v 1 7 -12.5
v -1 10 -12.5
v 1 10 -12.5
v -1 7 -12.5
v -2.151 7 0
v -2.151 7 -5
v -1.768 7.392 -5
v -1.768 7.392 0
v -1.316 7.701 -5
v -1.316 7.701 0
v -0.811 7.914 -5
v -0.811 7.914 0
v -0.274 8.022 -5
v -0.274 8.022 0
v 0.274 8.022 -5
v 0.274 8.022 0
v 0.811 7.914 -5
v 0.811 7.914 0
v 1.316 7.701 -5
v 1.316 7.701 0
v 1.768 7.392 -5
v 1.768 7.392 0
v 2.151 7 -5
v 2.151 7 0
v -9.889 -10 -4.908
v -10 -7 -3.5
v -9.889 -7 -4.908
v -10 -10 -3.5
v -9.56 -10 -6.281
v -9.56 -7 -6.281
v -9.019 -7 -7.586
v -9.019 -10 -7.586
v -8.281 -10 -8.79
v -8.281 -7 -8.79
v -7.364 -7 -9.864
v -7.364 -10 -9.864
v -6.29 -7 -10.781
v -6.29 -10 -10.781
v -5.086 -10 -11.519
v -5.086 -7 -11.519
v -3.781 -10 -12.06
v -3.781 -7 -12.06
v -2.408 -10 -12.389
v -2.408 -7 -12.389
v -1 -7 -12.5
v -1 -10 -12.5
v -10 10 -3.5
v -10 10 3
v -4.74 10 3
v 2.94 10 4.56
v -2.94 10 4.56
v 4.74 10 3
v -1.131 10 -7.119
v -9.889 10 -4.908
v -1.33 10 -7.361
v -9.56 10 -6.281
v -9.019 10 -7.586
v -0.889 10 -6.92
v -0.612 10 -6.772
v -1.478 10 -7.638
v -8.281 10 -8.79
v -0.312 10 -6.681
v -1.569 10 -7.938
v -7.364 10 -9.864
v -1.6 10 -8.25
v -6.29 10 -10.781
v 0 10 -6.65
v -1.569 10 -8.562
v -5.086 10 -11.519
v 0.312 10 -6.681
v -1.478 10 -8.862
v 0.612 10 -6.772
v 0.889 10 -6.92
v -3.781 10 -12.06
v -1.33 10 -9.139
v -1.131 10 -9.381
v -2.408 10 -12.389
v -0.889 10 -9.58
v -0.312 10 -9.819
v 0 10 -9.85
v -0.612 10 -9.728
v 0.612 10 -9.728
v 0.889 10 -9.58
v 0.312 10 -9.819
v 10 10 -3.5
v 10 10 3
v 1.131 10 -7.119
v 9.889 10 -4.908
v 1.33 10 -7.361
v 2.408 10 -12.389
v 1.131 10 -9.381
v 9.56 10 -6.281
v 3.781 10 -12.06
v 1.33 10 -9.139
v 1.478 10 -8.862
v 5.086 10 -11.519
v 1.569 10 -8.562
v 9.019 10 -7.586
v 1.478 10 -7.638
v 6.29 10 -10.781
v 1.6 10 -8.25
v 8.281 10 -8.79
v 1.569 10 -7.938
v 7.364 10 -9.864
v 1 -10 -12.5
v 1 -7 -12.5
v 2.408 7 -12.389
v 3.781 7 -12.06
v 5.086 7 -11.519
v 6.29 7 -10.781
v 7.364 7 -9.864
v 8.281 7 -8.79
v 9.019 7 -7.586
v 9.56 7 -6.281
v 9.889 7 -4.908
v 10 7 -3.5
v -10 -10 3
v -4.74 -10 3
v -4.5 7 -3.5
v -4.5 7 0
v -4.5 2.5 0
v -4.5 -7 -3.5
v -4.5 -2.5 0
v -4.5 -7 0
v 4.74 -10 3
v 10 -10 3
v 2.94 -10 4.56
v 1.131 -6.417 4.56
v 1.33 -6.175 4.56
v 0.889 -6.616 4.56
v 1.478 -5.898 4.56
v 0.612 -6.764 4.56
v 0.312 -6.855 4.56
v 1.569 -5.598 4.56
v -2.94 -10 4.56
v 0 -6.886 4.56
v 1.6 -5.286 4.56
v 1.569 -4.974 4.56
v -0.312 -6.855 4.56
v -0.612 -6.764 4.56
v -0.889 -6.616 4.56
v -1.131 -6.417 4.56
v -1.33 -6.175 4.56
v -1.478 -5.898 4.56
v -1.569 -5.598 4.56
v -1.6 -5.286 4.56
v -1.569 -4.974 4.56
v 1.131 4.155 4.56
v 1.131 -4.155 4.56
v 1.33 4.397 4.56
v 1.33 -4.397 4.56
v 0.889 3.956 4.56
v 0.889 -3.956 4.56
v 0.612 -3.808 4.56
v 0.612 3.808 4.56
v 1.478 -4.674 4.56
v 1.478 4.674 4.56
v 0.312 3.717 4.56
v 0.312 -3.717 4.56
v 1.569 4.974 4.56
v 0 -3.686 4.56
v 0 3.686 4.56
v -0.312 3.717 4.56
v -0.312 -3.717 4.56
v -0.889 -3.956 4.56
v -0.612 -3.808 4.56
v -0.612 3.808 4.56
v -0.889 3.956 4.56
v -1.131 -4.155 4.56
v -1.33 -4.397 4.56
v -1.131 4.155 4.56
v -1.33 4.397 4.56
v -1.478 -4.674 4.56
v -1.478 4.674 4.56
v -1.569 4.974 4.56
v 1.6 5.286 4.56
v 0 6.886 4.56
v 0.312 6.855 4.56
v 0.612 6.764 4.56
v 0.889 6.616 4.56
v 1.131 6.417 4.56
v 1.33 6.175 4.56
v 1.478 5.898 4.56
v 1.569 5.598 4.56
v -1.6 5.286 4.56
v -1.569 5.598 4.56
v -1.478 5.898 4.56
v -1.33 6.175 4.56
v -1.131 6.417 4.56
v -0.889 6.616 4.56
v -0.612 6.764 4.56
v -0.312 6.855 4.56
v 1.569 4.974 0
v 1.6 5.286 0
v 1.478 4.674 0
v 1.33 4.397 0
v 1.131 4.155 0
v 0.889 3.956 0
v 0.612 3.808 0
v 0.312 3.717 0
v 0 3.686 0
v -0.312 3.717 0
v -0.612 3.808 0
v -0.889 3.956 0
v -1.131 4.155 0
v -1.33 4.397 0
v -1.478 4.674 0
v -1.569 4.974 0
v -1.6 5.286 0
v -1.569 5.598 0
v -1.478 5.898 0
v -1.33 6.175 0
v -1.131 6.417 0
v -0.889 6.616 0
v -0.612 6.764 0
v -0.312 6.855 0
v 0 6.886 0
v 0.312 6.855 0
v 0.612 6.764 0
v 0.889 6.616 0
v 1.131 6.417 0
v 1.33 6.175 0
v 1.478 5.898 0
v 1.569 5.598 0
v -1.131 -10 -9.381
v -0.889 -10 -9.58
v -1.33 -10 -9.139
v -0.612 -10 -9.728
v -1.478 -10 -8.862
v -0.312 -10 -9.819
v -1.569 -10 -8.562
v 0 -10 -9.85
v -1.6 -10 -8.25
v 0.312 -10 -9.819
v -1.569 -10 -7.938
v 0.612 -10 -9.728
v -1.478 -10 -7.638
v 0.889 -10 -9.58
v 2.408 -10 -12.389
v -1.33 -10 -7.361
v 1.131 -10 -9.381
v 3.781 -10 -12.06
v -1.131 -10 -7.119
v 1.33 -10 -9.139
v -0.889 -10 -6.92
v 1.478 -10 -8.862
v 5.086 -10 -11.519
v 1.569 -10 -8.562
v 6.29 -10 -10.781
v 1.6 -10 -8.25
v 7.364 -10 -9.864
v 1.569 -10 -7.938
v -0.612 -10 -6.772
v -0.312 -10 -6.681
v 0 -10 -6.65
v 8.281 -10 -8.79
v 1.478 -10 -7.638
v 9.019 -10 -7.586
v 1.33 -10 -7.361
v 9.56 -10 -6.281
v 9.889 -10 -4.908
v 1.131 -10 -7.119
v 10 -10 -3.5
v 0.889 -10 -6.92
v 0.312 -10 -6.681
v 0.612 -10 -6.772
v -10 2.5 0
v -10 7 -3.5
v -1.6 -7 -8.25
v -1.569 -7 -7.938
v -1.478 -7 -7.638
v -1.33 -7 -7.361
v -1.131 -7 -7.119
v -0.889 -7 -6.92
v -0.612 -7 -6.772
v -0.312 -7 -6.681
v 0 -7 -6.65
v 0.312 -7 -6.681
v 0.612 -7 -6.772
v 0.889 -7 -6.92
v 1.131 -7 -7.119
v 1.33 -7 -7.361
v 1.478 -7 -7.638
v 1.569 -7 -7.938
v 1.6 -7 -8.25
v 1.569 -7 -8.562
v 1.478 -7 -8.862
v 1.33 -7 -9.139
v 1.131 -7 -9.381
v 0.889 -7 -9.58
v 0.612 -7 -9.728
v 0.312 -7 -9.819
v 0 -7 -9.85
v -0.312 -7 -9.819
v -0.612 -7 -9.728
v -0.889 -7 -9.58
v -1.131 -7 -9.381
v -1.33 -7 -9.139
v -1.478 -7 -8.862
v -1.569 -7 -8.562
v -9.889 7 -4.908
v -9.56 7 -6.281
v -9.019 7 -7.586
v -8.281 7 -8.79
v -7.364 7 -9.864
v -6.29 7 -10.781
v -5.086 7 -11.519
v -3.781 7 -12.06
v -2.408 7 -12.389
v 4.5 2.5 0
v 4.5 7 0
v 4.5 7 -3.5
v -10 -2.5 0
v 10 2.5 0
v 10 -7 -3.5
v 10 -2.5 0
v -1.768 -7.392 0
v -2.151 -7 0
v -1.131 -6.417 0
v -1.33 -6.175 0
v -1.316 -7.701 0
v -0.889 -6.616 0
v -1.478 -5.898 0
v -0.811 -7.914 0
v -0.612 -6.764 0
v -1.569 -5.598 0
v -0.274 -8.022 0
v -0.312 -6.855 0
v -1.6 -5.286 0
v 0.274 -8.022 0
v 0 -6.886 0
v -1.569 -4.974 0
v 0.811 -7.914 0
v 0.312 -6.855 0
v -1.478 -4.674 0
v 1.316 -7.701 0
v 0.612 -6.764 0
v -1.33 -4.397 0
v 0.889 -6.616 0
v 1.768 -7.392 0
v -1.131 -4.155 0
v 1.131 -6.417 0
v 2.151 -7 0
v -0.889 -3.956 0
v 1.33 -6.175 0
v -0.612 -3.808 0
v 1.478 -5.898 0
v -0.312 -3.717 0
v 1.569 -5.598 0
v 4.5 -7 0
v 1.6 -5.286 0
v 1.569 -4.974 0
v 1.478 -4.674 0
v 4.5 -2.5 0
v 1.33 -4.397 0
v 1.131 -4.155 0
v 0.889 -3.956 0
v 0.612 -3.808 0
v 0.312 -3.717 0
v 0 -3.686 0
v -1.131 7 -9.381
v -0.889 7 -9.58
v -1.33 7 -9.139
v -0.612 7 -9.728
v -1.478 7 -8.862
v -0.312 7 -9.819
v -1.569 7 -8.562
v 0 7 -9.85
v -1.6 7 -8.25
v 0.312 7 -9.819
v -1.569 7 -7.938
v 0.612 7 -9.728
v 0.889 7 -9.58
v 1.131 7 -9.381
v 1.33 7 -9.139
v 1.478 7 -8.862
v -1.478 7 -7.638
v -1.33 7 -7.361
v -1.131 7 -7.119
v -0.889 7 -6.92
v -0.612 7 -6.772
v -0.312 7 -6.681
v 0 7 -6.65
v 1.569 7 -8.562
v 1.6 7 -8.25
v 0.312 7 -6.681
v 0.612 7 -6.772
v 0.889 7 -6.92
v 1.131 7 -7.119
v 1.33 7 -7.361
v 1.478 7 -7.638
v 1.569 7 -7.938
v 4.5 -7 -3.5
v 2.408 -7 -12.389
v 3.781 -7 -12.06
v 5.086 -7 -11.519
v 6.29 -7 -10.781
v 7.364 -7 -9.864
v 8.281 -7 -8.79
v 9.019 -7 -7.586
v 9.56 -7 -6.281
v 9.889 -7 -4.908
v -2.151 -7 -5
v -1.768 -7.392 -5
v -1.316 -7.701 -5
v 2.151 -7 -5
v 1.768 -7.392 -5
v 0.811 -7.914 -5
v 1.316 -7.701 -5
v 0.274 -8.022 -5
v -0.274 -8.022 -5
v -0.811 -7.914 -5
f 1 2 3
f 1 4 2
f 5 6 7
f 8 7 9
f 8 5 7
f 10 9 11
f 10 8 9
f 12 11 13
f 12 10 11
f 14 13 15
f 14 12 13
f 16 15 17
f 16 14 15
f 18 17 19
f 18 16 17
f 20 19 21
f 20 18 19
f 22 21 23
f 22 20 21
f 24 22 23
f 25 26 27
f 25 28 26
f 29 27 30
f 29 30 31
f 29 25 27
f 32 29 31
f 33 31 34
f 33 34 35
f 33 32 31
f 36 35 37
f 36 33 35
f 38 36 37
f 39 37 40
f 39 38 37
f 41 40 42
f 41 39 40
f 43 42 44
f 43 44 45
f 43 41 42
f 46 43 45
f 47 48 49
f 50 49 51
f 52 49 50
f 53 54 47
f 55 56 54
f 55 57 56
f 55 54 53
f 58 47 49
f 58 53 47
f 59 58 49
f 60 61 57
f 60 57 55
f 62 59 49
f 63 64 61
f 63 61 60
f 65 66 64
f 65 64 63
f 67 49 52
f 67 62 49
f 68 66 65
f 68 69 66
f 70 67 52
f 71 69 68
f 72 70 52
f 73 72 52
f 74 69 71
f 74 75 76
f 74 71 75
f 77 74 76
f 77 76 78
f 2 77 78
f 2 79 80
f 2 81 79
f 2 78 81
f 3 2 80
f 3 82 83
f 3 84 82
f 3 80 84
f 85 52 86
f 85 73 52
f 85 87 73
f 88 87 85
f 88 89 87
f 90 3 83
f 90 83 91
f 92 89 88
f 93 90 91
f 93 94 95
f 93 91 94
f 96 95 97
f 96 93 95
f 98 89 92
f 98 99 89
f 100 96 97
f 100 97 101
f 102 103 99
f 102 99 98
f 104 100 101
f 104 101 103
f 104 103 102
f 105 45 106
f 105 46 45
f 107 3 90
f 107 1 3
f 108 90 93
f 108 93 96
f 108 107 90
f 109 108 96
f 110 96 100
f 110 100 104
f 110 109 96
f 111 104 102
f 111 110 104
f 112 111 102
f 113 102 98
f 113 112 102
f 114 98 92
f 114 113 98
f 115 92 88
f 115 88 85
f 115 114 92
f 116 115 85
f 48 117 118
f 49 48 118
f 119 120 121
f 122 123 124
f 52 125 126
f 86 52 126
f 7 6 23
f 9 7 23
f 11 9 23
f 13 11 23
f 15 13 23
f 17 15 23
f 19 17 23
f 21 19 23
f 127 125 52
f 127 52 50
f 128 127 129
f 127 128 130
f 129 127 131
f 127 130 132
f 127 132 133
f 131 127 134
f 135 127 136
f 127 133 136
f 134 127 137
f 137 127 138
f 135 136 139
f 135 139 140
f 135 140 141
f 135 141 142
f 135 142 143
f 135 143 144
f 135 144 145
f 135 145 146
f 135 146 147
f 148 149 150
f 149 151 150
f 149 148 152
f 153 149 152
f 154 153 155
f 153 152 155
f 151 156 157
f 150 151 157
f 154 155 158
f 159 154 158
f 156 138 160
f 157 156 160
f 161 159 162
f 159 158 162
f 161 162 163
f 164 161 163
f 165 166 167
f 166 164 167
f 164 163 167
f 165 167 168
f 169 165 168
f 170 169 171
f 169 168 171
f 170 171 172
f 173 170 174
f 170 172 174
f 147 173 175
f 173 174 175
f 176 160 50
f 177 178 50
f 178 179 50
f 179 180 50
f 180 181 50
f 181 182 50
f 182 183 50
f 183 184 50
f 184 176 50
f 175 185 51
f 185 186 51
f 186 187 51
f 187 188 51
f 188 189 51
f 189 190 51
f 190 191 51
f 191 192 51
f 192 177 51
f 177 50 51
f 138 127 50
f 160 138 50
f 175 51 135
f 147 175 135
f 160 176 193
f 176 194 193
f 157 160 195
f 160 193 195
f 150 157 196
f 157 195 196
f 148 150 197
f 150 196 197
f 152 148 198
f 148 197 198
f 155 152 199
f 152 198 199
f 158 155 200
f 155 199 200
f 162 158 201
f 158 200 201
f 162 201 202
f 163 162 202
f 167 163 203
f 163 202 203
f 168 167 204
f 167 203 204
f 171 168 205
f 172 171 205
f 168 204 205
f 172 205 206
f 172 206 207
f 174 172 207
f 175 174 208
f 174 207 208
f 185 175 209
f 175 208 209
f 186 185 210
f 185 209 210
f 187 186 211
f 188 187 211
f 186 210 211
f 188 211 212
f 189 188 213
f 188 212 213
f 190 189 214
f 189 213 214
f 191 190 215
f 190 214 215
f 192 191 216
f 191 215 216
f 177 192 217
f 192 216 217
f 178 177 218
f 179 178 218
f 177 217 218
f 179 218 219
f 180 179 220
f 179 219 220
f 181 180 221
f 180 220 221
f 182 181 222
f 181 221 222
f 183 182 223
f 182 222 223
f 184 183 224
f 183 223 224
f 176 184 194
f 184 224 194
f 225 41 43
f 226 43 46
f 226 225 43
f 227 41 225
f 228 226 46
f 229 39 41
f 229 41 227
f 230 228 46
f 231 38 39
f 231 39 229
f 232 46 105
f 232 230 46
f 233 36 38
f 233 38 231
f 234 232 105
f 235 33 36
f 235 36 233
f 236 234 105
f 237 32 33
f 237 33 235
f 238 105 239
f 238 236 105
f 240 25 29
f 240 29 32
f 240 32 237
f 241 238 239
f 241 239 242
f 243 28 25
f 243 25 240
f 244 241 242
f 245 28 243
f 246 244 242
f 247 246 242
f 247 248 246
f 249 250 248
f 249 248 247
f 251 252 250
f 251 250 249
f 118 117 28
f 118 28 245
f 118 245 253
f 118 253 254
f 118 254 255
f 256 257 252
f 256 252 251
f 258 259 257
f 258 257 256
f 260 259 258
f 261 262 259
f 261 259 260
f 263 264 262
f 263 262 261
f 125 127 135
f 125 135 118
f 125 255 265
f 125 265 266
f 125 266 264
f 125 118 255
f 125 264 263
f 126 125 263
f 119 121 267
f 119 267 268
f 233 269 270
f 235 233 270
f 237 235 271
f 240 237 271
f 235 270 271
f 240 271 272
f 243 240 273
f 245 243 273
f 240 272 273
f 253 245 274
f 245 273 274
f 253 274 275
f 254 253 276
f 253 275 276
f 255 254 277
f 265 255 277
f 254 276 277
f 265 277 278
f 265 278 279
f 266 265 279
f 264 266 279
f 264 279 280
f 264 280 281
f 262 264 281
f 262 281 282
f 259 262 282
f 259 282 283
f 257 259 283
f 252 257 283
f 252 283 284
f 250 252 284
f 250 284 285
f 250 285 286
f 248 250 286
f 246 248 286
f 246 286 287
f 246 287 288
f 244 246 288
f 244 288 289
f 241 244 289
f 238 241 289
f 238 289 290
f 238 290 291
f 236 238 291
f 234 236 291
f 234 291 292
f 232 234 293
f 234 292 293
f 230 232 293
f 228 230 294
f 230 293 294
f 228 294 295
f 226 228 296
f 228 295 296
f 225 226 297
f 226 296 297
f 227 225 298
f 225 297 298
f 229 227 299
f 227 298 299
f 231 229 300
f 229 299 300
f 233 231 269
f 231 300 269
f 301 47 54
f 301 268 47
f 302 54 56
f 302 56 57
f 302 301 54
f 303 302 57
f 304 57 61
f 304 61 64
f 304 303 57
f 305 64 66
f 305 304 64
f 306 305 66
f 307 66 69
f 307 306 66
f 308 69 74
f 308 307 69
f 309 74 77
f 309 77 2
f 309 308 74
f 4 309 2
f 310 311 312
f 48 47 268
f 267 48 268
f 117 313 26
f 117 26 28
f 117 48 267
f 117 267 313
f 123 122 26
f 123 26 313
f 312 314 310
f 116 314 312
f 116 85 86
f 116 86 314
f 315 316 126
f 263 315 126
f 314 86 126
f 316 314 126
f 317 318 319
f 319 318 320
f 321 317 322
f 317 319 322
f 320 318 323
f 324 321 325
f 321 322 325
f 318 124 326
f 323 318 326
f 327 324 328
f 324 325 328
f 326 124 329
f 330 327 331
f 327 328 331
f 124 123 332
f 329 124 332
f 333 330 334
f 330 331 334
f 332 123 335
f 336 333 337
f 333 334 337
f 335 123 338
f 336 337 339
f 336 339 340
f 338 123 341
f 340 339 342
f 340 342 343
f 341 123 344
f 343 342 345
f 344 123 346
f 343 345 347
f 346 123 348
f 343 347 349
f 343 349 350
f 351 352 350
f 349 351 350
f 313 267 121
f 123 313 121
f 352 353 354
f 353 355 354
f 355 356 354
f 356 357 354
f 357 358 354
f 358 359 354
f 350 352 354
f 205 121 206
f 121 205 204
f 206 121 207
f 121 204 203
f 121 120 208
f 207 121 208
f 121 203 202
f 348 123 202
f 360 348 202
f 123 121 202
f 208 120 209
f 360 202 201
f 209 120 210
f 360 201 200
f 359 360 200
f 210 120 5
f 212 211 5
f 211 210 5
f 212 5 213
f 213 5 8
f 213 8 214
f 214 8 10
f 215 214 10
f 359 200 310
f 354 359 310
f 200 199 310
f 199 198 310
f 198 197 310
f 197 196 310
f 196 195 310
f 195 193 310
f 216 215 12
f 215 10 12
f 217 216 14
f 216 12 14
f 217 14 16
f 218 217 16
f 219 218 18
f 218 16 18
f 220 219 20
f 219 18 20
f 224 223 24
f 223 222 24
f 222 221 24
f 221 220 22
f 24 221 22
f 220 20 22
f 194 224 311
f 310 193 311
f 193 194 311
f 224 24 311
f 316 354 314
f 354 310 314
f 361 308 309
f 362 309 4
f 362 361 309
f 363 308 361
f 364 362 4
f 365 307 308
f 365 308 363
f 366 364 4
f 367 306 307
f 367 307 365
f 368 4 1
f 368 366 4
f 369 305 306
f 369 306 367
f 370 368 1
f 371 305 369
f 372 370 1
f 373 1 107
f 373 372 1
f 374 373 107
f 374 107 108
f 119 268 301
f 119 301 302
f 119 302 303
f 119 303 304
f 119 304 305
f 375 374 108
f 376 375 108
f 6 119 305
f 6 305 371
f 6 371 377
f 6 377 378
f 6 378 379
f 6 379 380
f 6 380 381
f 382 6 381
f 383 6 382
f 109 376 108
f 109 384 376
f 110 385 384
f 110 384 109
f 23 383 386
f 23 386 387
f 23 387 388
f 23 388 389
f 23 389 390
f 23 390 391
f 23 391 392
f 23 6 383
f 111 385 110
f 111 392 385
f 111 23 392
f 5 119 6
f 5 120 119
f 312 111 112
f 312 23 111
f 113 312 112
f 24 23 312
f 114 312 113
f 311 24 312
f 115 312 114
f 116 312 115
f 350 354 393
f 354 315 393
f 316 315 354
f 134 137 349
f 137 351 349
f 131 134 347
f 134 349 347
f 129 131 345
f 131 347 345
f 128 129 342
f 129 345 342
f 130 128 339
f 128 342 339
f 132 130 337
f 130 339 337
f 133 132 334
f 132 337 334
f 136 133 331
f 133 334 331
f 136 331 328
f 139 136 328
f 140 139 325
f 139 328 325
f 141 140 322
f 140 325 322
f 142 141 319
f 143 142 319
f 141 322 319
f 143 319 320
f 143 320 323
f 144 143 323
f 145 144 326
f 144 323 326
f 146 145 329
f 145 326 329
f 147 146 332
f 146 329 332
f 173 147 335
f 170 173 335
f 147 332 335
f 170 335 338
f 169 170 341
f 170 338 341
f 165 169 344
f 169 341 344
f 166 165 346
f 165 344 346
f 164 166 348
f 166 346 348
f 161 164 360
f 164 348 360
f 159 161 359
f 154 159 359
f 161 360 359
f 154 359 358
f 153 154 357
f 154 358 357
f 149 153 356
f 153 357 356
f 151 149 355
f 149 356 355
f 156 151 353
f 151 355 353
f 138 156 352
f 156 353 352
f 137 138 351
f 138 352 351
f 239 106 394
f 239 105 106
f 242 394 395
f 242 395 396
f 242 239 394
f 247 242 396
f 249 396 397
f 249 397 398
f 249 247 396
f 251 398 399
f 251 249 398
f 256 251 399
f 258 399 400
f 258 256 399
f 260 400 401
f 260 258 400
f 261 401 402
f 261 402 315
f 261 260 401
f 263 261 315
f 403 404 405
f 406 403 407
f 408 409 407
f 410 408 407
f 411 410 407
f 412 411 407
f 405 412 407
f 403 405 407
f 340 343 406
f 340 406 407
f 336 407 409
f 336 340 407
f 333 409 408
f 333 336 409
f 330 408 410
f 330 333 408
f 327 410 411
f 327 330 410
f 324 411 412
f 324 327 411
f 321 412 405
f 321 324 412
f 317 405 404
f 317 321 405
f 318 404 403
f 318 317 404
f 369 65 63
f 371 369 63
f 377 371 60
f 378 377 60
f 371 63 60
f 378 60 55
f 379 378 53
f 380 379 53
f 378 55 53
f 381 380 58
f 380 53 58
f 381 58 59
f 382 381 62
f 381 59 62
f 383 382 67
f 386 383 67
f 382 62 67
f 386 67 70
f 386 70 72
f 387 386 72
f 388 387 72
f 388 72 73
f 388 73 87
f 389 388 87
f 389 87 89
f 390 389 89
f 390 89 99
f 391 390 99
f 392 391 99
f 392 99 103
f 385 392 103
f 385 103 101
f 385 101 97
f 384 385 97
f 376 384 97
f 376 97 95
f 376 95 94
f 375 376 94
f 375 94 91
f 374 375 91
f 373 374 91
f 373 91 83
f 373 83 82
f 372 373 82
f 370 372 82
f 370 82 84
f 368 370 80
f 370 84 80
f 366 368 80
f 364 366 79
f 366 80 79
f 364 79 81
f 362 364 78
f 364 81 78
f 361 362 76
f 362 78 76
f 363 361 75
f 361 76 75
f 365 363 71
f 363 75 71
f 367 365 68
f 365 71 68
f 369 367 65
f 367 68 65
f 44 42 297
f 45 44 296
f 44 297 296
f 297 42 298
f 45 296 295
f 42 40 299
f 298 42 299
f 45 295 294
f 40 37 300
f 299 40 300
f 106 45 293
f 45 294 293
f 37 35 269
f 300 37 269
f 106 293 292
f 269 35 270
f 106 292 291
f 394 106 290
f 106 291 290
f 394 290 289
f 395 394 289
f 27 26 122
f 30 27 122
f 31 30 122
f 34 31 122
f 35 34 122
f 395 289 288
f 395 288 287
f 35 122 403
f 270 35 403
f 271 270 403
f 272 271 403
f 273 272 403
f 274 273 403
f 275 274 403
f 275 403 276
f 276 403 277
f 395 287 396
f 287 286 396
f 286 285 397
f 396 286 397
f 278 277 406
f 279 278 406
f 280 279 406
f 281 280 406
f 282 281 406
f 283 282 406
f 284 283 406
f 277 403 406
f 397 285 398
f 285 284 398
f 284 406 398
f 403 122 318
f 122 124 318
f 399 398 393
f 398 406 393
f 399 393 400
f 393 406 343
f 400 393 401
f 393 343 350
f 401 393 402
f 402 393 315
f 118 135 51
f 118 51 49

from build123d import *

# Parameters (mm, degrees)
SKETCH_W        = 20
SKETCH_H        = 20
SKETCH_R        = 1.6
PAD_DEPTH       = 3
PAD001_DEPTH    = 20
SKETCH002_R     = 1.6
POCKET_DEPTH    = 4.561
SKETCH003_W     = 20
SKETCH003_H     = 3
PAD002_DEPTH    = 12.5
SKETCH004_R     = 2.75
POCKET001_DEPTH = 5
SKETCH005_R     = 1.6
POCKET002_DEPTH = 20.001
FILLET_R        = 9
SKETCH006_W     = 5.5
SKETCH006_H     = 4.5
PAD003_DEPTH    = 3.5
POCKET003_DEPTH = 20.001


with BuildPart() as part:
    # Sketch → Pad (new body)
    with BuildSketch(Plane.XY):
        Rectangle(SKETCH_W, SKETCH_H)
        with Locations((0, -5.286)):
            Circle(SKETCH_R, mode=Mode.SUBTRACT)
        with Locations((0, 5.286)):
            Circle(SKETCH_R, mode=Mode.SUBTRACT)
    extrude(amount=PAD_DEPTH)

    # Sketch001 (on Face1 of Pad) → Pad001 (join)
    with BuildSketch(Plane(origin=(0, 10, 0), x_dir=(-1, 0, 0), z_dir=(0, 1, 0))):
        Polygon((0, 3), (-4.74, 3), (-2.94, 4.56), (2.94, 4.56), (4.74, 3), align=None)
    extrude(amount=-PAD001_DEPTH)

    # Sketch002 (on Face4 of Pad001) → Pocket (cut, through all)
    with BuildSketch(Plane(origin=(0, 0, 0), x_dir=(1, 0, 0), z_dir=(0, 0, -1))):
        with Locations((0, 5.286)):
            Circle(SKETCH002_R)
        with Locations((0, -5.286)):
            Circle(SKETCH002_R)
    extrude(amount=-POCKET_DEPTH, mode=Mode.SUBTRACT)

    # Sketch003 (on Face4 of Pocket) → Pad002 (join)
    with BuildSketch(Plane(origin=(0, 0, 0), x_dir=(1, 0, 0), z_dir=(0, 0, -1))):
        with Locations((0, 8.5)):
            Rectangle(SKETCH003_W, SKETCH003_H)
        with Locations((0, -8.5)):
            Rectangle(SKETCH003_W, SKETCH003_H)
    extrude(amount=PAD002_DEPTH)

    # Sketch004 (on Face10 of Pad002) → Pocket001 (cut)
    with BuildSketch(Plane(origin=(0, 0, 0), x_dir=(1, 0, 0), z_dir=(0, 0, -1))):
        with Locations((0, 5.286)):
            Circle(SKETCH004_R)
        with Locations((0, -5.286)):
            Circle(SKETCH004_R)
    extrude(amount=POCKET001_DEPTH, mode=Mode.SUBTRACT)

    # Sketch005 (on Face4 of Pocket001) → Pocket002 (cut, through all)
    with BuildSketch(Plane(origin=(0, 10, 0), x_dir=(-1, 0, 0), z_dir=(0, 1, 0))):
        with Locations((0, -8.25)):
            Circle(SKETCH005_R)
    extrude(amount=-POCKET002_DEPTH, mode=Mode.SUBTRACT)

    # Fillet
    fillet_edges = [part.edges().sort_by_distance(p)[0] for p in [
        (10, 8.5, -12.5),
        (-10, 8.5, -12.5),
        (10, -8.5, -12.5),
        (-10, -8.5, -12.5),
    ]]
    fillet(fillet_edges, radius=FILLET_R)

    # Sketch006 (on Face15 of Fillet) → Pad003 (join)
    with BuildSketch(Plane(origin=(0, 0, 0), x_dir=(1, 0, 0), z_dir=(0, 0, -1))):
        with Locations((-7.25, 4.75)):
            Rectangle(SKETCH006_W, SKETCH006_H)
        with Locations((-7.25, -4.75)):
            Rectangle(SKETCH006_W, SKETCH006_H)
        with Locations((7.25, 4.75)):
            Rectangle(SKETCH006_W, SKETCH006_H)
        with Locations((7.25, -4.75)):
            Rectangle(SKETCH006_W, SKETCH006_H)
    extrude(amount=PAD003_DEPTH)

    # Sketch007 (on Face9 of Pad003) → Pocket003 (cut, through all)
    with BuildSketch(Plane.YZ.offset(10)):
        Polygon((-2.5, 0), (-2.5, -3.5), (-7, -3.5), align=None)
        Polygon((7, -3.5), (2.5, -3.5), (2.5, 0), align=None)
    extrude(amount=-POCKET003_DEPTH, mode=Mode.SUBTRACT)


solid = part.part
